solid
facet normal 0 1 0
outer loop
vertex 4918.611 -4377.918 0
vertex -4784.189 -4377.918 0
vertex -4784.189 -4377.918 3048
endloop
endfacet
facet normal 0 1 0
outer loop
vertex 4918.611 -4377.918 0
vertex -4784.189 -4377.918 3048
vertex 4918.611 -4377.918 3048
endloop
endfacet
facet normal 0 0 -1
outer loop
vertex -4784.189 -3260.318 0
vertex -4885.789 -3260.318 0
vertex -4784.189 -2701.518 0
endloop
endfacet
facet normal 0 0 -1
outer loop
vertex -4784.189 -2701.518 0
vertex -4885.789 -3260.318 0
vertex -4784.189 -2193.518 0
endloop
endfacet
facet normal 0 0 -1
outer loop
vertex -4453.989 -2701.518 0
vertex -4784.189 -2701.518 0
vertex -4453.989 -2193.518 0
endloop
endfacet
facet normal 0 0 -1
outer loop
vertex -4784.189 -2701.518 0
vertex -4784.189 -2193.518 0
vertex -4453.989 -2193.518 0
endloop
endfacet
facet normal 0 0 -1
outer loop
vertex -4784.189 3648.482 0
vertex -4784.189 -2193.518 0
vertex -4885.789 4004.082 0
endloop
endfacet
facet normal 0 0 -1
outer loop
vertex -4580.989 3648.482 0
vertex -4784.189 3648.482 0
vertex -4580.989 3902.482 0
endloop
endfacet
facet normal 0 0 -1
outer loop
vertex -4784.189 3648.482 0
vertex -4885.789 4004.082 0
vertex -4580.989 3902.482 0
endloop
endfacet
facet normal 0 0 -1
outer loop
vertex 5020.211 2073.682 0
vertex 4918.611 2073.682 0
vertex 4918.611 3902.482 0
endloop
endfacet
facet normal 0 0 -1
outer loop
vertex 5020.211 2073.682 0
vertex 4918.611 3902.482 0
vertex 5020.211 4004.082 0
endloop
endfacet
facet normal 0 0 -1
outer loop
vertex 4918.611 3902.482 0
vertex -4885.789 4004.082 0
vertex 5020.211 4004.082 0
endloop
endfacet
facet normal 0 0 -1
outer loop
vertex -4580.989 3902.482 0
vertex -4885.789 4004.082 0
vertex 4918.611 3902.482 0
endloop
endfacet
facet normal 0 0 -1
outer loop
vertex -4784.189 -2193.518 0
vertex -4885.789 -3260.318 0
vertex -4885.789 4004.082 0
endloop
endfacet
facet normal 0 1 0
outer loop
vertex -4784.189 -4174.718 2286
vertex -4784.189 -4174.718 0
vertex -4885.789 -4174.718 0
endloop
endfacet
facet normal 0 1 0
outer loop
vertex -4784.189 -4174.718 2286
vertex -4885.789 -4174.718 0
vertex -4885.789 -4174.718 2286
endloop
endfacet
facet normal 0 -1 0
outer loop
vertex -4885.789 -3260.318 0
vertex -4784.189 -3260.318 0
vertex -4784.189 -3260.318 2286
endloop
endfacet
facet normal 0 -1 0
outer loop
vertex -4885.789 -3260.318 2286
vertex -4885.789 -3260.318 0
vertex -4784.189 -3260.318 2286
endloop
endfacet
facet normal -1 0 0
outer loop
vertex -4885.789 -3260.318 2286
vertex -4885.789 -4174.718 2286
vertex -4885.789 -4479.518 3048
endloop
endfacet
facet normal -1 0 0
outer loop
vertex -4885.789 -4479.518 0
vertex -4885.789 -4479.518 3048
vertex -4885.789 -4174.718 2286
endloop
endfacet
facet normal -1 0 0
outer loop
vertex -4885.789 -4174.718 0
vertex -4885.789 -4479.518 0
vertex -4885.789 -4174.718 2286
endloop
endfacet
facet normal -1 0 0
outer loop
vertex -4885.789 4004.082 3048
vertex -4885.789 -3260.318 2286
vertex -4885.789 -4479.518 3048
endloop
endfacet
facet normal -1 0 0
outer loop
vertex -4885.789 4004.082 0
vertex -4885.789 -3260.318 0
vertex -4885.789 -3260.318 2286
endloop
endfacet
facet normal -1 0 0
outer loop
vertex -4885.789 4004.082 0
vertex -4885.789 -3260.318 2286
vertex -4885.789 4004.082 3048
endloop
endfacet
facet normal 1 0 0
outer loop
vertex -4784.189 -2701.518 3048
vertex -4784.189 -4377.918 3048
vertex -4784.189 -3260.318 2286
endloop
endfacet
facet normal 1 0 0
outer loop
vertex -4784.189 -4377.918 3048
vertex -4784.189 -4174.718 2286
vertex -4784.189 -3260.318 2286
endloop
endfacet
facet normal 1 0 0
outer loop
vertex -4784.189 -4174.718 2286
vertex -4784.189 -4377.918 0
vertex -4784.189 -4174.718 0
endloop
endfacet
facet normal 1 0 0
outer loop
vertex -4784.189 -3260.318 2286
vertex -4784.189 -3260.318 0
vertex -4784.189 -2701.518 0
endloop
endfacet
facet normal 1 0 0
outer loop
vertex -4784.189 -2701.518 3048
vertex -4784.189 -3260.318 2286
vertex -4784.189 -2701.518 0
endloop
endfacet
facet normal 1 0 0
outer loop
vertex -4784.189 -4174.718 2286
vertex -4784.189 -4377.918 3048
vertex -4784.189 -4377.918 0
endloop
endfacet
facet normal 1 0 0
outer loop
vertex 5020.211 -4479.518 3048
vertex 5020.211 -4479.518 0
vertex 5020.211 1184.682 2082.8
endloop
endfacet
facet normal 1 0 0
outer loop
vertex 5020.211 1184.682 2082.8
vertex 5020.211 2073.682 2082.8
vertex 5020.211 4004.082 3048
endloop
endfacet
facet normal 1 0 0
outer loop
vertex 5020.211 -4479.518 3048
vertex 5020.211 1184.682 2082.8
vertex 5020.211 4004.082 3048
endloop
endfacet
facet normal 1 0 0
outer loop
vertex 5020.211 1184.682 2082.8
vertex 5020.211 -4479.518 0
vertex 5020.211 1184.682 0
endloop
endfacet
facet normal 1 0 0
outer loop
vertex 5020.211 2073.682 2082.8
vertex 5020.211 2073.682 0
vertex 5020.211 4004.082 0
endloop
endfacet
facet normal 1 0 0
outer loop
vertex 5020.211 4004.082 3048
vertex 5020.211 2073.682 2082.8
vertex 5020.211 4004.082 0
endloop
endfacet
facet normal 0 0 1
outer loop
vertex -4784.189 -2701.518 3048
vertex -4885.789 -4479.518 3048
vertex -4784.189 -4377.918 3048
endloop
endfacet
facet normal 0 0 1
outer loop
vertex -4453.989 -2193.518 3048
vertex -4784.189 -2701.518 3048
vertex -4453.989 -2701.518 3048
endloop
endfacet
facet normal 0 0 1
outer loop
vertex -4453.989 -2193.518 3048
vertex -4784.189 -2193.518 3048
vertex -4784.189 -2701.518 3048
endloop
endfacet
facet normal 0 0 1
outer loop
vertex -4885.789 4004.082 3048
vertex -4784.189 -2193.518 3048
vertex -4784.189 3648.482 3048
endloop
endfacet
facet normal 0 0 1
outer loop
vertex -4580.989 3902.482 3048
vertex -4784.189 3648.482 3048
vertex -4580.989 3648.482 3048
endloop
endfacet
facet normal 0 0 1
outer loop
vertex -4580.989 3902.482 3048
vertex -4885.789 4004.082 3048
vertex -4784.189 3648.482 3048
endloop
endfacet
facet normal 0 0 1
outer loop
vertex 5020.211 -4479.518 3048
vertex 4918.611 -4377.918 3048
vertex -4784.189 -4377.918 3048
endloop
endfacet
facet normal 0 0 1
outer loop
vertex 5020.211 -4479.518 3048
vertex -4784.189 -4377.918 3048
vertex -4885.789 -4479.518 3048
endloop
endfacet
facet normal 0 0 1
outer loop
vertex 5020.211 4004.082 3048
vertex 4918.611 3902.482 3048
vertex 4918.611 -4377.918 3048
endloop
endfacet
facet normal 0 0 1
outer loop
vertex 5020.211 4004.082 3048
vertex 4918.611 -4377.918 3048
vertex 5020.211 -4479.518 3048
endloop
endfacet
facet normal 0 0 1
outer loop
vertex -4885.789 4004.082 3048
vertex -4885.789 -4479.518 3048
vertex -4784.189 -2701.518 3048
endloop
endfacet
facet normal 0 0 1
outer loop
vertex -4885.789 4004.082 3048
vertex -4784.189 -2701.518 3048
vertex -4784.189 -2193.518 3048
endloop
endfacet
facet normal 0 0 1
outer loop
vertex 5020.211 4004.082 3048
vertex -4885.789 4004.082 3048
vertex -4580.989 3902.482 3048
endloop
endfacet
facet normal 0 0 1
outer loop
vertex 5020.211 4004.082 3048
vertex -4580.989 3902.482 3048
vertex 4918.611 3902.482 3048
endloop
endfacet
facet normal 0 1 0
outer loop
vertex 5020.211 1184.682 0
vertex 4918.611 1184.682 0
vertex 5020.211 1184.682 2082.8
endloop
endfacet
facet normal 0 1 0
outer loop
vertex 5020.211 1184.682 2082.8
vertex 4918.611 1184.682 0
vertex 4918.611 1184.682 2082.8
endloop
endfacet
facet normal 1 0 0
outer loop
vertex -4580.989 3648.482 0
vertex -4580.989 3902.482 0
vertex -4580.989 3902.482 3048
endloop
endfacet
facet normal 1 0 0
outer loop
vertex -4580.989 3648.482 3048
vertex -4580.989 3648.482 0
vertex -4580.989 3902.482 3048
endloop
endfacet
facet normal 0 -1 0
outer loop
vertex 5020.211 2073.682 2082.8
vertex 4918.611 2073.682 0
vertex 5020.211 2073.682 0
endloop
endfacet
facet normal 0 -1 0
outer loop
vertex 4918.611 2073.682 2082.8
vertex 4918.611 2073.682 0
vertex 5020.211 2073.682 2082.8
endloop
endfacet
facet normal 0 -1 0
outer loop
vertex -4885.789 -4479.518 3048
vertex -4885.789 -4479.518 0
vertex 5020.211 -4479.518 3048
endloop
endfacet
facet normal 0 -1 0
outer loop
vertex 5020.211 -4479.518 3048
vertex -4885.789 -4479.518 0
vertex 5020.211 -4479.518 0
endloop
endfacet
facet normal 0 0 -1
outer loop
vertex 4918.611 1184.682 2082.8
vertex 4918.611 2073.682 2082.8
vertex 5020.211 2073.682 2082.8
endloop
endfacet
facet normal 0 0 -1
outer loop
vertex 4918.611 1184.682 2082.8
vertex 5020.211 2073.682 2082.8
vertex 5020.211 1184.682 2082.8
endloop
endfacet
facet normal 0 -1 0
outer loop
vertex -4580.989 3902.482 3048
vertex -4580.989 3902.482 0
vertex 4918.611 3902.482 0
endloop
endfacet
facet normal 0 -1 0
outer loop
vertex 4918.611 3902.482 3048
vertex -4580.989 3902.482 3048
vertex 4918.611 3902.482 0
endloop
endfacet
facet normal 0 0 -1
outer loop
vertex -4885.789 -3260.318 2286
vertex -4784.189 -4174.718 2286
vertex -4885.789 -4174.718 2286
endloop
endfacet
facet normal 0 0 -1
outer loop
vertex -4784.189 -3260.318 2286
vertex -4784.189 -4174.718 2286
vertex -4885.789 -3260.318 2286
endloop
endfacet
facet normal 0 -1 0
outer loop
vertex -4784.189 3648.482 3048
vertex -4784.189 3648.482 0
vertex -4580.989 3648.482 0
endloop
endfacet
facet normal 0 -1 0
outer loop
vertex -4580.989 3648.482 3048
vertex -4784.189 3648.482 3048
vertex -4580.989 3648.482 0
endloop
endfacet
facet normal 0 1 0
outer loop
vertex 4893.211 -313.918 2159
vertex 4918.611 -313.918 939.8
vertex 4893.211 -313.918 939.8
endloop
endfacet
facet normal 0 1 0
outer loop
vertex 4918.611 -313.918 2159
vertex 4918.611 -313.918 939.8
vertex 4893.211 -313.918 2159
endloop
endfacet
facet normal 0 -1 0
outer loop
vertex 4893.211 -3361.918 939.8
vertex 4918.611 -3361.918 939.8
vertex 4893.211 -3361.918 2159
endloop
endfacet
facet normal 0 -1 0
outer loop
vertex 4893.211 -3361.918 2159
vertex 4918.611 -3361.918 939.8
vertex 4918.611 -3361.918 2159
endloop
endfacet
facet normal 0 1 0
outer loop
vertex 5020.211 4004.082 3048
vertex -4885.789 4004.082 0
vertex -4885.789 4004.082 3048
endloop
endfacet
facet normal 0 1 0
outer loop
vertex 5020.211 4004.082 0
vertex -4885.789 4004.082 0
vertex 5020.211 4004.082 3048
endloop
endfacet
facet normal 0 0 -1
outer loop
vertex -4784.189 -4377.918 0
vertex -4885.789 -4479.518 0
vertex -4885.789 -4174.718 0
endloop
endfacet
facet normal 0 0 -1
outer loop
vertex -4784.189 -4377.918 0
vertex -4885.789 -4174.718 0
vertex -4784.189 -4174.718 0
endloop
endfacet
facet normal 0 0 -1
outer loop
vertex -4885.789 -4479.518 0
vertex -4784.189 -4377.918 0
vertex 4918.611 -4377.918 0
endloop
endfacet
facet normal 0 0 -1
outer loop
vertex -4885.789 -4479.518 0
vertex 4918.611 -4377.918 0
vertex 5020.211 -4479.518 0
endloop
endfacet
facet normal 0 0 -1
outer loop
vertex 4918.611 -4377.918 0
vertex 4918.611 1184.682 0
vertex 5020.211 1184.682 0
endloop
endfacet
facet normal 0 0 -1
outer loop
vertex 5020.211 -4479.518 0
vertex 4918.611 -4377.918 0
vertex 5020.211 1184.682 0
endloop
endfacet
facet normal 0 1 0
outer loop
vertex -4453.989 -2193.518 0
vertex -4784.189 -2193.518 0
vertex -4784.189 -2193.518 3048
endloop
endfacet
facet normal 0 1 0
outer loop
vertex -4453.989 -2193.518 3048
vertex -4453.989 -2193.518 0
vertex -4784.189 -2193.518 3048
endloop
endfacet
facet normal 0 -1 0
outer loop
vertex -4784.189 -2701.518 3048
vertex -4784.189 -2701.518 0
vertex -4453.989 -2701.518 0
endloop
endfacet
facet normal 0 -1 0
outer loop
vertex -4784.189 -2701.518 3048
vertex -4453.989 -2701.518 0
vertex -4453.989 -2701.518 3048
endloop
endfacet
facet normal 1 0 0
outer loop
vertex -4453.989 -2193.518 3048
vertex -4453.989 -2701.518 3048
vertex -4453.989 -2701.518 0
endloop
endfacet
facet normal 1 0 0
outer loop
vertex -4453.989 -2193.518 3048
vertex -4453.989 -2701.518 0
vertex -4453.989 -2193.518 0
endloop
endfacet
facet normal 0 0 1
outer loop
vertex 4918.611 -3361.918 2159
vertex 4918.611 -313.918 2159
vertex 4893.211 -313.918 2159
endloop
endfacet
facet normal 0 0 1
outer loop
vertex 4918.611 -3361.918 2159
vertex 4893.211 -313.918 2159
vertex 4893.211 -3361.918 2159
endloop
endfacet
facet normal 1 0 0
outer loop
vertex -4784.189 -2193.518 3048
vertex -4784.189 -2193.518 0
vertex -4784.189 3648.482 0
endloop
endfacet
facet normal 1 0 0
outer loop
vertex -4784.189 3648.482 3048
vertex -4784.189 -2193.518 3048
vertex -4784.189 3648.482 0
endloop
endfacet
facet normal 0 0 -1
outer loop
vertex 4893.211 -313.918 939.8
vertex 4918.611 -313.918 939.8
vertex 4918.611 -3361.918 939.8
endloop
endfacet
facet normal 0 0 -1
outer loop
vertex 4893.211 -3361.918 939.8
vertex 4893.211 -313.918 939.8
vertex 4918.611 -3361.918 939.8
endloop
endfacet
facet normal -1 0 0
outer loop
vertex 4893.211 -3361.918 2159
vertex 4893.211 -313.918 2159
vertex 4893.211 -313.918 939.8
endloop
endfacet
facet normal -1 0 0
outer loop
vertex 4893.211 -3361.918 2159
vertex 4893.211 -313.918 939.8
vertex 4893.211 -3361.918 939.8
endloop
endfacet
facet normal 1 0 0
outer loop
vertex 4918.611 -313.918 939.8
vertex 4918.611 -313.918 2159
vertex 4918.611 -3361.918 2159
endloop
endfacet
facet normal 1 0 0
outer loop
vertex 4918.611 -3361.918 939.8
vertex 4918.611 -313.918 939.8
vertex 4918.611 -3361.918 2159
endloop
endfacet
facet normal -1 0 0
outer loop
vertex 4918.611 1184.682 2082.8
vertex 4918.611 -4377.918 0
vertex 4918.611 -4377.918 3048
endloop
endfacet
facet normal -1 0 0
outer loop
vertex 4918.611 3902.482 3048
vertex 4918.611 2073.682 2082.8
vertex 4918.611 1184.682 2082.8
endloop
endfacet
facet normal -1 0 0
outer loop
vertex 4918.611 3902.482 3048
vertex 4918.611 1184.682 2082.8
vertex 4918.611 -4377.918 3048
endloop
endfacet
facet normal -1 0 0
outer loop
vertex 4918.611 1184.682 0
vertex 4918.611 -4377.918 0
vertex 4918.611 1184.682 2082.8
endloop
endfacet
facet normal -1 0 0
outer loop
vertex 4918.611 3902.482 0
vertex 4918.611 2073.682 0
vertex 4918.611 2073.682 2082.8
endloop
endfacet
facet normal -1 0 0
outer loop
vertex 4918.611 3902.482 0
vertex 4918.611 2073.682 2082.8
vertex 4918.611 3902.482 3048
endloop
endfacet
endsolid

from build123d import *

# Parameters (mm, degrees)
F0_W      = 9906
F0_H      = 8483.6
F0_W_2    = 9702.8
F0_H_2    = 8280.4
F1_DEPTH  = 3048
F4_W      = 203.2
F4_H      = 3048
F5_DEPTH  = 254
F6_W      = 914.4
F6_H      = 2286
F7_DEPTH  = 101.601
F8_W      = 508
F8_H      = 3048
F9_DEPTH  = 330.2
F10_W     = 889
F10_H     = 2082.8
F11_DEPTH = 101.601
F12_W     = 3048
F12_H     = 1219.2
F13_DEPTH = 25.4


with BuildPart() as f1:
    # F0 (on Top) → F1 (new body)
    with BuildSketch(Plane.XY):
        with Locations((67.211082, -237.717982)):
            Rectangle(F0_W, F0_H)
        with Locations((67.211082, -237.717982)):
            Rectangle(F0_W_2, F0_H_2, mode=Mode.SUBTRACT)
    extrude(amount=F1_DEPTH)

    # F4 (on face) → F5 (join)
    with BuildSketch(Plane.XZ.offset(-3902.482018)):
        with Locations((-4682.588918, 1524)):
            Rectangle(F4_W, F4_H)
    extrude(amount=F5_DEPTH)

    # F6 (on face) → F7 (cut, through all)
    with BuildSketch(Plane.YZ.offset(-4784.188918)):
        with Locations((-3717.517982, 1143)):
            Rectangle(F6_W, F6_H)
    extrude(amount=-F7_DEPTH, mode=Mode.SUBTRACT)

    # F8 (on face) → F9 (join)
    with BuildSketch(Plane.YZ.offset(-4784.188918)):
        with Locations((-2447.517982, 1524)):
            Rectangle(F8_W, F8_H)
    extrude(amount=F9_DEPTH)

    # F10 (on face) → F11 (cut, through all)
    with BuildSketch(Plane(origin=(4918.611082, 0, 0), x_dir=(0, -1, 0), z_dir=(-1, 0, 0))):
        with Locations((-1629.182018, 1041.4)):
            Rectangle(F10_W, F10_H)
    extrude(amount=-F11_DEPTH, mode=Mode.SUBTRACT)


with BuildPart() as f13:
    # F12 (on face) → F13 (new body)
    with BuildSketch(Plane(origin=(4918.611082, 0, 0), x_dir=(0, -1, 0), z_dir=(-1, 0, 0))):
        with Locations((1837.917982, 1549.4)):
            Rectangle(F12_W, F12_H)
    extrude(amount=F13_DEPTH)


solid = Compound([f1.part, f13.part])
